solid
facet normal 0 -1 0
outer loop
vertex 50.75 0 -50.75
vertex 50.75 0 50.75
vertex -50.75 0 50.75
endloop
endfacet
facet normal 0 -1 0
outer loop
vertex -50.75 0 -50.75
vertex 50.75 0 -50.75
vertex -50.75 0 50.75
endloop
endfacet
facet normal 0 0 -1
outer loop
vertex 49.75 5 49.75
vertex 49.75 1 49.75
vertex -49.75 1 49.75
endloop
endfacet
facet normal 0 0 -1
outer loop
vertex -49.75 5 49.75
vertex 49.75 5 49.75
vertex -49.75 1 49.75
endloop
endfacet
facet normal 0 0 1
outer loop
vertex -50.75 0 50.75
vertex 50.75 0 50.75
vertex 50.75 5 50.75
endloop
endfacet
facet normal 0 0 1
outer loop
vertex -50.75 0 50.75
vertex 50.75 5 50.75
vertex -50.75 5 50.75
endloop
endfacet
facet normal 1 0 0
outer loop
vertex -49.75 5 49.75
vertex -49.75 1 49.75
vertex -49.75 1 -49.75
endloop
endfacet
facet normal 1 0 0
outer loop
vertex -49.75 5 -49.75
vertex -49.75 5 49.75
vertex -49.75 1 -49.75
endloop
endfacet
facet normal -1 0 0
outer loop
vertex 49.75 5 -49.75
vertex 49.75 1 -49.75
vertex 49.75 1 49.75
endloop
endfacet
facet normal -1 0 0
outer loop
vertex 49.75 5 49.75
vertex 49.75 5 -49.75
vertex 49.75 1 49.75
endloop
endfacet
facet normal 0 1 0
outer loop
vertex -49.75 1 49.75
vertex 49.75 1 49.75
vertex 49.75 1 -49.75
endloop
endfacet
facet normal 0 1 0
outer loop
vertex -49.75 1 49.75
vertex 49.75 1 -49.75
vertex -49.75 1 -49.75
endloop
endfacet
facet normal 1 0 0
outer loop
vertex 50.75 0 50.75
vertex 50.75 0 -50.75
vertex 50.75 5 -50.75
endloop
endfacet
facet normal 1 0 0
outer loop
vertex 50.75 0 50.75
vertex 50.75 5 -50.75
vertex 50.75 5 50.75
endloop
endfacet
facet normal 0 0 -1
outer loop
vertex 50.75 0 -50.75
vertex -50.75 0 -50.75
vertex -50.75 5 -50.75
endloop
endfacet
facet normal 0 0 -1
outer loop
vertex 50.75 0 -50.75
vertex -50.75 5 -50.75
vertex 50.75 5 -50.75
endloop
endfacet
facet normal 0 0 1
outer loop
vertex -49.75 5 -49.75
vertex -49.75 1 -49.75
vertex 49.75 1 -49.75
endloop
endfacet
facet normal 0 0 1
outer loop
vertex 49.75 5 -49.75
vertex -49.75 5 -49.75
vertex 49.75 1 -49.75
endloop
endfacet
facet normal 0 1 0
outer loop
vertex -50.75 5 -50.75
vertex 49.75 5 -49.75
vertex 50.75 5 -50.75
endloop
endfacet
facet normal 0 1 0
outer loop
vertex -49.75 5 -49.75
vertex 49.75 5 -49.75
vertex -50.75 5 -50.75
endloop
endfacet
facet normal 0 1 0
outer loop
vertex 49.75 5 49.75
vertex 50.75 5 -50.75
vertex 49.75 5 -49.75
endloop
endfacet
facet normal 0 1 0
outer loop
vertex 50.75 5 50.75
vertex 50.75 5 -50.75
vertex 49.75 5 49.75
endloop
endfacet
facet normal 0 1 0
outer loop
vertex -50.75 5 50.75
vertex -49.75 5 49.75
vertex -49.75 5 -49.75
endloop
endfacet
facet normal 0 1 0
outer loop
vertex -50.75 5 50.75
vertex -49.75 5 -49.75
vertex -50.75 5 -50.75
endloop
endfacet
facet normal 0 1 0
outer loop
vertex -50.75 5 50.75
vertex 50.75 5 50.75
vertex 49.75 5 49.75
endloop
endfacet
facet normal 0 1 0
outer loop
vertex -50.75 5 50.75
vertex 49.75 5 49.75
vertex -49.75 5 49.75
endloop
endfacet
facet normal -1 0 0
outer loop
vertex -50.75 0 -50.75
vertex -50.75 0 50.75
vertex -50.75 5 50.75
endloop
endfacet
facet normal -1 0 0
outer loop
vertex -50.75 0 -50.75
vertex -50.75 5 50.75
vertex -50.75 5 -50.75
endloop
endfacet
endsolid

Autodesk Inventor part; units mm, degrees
ref_plane "YZ Plane" through (0, 0, 0) normal (1, 0, 0) x (0, 1, 0)
ref_plane "XZ Plane" through (0, 0, 0) normal (0, 1, 0) x (-1, 0, 0)
ref_plane "XY Plane" through (0, 0, 0) normal (0, 0, 1) x (1, 0, 0)
sketch "Náčrt1" plane through (0, 0, 0) normal (0, 1, 0) x (-1, 0, 0)
  line L0 (49.75, -49.75) -> (-49.75, -49.75)
  line L1 (-49.75, -49.75) -> (-49.75, 49.75)
  line L2 (-49.75, 49.75) -> (49.75, 49.75)
  line L3 (49.75, 49.75) -> (49.75, -49.75)
  line L4 (49.75, -49.75) -> (0, 0) construction
  line L5 (0, 0) -> (-49.75, -49.75) construction
  line L6 (0, 0) -> (-49.75, 49.75) construction
  line L7 (50.75, -50.75) -> (-50.75, -50.75)
  line L8 (-50.75, -50.75) -> (-50.75, 50.75)
  line L9 (-50.75, 50.75) -> (50.75, 50.75)
  line L10 (50.75, 50.75) -> (50.75, -50.75)
  dimension "d0" = 99.5
  dimension "d3" = 1
extrude "Vysunutí1" add sketch "Náčrt1" along normal blind 1 contours L0 L1 L2 L3
extrude "Vysunutí2" add sketch "Náčrt1" along normal blind 5
properties part number "box"
